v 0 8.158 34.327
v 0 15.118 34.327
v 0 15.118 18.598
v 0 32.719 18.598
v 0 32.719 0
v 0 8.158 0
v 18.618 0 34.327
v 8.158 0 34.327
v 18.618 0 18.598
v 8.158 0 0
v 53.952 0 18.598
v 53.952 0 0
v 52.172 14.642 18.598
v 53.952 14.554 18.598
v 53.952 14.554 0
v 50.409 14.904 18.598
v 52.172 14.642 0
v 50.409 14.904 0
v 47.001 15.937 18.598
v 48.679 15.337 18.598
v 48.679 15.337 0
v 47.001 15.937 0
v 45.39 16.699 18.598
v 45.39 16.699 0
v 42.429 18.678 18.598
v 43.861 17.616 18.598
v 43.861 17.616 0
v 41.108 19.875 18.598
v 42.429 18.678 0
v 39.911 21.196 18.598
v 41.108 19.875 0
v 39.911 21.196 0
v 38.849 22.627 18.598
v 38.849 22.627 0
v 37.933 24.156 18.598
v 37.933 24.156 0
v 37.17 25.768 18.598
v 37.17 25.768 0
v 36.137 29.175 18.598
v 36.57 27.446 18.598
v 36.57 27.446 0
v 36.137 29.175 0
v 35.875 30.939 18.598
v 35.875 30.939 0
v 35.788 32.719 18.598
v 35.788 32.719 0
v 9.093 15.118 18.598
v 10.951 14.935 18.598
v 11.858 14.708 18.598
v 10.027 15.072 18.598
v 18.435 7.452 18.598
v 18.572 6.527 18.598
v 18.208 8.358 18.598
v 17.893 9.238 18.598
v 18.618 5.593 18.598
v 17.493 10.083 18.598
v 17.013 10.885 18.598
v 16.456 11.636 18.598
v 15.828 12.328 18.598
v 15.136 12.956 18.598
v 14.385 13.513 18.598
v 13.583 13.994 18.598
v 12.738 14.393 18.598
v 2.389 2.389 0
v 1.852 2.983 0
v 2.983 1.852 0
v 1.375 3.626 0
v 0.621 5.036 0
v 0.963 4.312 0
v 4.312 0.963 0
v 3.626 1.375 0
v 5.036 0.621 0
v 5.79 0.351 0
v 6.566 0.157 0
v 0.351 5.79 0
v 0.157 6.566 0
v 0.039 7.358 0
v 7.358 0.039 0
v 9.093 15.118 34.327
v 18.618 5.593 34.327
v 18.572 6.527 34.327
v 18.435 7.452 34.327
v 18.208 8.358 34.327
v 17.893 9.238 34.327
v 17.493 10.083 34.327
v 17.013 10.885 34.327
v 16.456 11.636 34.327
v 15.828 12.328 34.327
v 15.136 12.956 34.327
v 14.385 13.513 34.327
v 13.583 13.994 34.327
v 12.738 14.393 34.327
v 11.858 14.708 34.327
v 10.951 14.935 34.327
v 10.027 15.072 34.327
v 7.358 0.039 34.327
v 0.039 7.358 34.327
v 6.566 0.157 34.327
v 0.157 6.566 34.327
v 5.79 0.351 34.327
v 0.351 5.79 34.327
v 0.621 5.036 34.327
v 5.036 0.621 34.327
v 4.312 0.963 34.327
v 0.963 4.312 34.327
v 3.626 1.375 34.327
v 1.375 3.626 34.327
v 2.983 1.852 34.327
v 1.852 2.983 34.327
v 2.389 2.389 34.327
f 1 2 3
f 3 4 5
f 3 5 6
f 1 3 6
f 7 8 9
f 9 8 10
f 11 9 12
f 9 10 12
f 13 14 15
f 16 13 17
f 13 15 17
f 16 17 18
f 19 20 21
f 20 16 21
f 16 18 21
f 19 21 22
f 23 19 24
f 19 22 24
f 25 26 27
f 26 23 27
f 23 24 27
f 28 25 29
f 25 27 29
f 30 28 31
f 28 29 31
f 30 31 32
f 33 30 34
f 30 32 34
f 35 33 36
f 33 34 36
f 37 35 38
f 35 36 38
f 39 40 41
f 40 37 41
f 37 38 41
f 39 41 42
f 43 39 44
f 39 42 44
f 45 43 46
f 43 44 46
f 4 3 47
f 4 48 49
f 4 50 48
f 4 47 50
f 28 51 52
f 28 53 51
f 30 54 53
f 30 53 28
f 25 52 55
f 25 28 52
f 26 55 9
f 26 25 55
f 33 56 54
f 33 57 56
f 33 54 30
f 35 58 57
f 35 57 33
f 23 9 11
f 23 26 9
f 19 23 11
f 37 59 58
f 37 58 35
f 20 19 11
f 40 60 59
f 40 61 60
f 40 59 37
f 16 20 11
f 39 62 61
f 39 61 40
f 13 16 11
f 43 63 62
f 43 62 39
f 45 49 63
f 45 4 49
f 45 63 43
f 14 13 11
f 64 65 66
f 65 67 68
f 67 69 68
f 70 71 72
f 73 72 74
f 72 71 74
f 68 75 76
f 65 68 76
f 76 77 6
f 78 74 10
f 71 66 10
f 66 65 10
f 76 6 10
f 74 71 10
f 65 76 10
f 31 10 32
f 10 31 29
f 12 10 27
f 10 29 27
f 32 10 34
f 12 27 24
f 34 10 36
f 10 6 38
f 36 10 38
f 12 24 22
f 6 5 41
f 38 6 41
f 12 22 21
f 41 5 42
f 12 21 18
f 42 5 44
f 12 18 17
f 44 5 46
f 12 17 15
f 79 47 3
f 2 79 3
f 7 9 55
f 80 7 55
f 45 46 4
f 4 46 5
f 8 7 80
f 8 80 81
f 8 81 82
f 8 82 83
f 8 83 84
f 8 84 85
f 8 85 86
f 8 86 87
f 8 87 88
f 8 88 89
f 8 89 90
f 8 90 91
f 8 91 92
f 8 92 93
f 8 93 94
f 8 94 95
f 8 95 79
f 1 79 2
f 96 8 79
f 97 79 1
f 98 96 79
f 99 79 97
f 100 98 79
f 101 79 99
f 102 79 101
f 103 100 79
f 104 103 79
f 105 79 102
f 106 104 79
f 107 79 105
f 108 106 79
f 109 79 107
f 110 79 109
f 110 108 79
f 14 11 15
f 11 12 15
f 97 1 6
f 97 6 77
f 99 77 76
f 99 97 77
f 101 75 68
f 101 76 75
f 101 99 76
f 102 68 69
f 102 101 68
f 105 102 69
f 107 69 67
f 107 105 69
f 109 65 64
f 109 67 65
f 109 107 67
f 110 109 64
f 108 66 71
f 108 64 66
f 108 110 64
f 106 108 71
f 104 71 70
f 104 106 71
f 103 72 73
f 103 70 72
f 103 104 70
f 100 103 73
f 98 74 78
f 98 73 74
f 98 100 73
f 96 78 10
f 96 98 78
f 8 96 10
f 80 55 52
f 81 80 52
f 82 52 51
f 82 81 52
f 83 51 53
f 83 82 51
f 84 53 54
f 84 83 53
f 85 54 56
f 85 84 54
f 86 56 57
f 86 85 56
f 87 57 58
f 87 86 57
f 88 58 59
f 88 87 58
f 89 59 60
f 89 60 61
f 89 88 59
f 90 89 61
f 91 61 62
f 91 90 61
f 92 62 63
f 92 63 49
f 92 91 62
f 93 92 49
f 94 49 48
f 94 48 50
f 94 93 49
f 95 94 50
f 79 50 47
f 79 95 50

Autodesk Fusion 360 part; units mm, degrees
sketch "Sketch1" plane through (0, 0, 0) normal (0, 0, 1) x (1, 0, 0)
  line L0 (0, 0) -> (53.9524, 0)
  line L1 (53.9524, 0) -> (53.9524, 14.5545)
  line L2 (35.7878, 32.7191) -> (0, 32.7191)
  line L3 (0, 32.7191) -> (0, 0)
  arc A0 (35.7878, 32.7191) -> (53.9524, 14.5545) centre (53.9524, 32.7191) ccw
extrude "Extrude1" add sketch "Sketch1" along normal blind 18.598
sketch "Sketch2" plane through (0, 0, 18.598) normal (0, 0, 1) x (-1, 0, 0)
  line L0 (0, 0) -> (-18.618, 0)
  line L1 (-18.618, 0) -> (-18.618, -15.1183)
  line L2 (-18.618, -15.1183) -> (0, -15.1183)
  line L3 (0, -15.1183) -> (0, 0)
extrude "Extrude2" add sketch "Sketch2" along normal blind 15.729
fillet "Fillet1" radius 9.525 1 edges at (18.618, 15.1183, 26.4625)
fillet "Fillet2" radius 8.158 1 edges at (0, 0, 17.1635)
ref_plane "WorkPlane1" through (0, 0, 45.086) normal (0, 0, 1) x (1, 0, 0)
